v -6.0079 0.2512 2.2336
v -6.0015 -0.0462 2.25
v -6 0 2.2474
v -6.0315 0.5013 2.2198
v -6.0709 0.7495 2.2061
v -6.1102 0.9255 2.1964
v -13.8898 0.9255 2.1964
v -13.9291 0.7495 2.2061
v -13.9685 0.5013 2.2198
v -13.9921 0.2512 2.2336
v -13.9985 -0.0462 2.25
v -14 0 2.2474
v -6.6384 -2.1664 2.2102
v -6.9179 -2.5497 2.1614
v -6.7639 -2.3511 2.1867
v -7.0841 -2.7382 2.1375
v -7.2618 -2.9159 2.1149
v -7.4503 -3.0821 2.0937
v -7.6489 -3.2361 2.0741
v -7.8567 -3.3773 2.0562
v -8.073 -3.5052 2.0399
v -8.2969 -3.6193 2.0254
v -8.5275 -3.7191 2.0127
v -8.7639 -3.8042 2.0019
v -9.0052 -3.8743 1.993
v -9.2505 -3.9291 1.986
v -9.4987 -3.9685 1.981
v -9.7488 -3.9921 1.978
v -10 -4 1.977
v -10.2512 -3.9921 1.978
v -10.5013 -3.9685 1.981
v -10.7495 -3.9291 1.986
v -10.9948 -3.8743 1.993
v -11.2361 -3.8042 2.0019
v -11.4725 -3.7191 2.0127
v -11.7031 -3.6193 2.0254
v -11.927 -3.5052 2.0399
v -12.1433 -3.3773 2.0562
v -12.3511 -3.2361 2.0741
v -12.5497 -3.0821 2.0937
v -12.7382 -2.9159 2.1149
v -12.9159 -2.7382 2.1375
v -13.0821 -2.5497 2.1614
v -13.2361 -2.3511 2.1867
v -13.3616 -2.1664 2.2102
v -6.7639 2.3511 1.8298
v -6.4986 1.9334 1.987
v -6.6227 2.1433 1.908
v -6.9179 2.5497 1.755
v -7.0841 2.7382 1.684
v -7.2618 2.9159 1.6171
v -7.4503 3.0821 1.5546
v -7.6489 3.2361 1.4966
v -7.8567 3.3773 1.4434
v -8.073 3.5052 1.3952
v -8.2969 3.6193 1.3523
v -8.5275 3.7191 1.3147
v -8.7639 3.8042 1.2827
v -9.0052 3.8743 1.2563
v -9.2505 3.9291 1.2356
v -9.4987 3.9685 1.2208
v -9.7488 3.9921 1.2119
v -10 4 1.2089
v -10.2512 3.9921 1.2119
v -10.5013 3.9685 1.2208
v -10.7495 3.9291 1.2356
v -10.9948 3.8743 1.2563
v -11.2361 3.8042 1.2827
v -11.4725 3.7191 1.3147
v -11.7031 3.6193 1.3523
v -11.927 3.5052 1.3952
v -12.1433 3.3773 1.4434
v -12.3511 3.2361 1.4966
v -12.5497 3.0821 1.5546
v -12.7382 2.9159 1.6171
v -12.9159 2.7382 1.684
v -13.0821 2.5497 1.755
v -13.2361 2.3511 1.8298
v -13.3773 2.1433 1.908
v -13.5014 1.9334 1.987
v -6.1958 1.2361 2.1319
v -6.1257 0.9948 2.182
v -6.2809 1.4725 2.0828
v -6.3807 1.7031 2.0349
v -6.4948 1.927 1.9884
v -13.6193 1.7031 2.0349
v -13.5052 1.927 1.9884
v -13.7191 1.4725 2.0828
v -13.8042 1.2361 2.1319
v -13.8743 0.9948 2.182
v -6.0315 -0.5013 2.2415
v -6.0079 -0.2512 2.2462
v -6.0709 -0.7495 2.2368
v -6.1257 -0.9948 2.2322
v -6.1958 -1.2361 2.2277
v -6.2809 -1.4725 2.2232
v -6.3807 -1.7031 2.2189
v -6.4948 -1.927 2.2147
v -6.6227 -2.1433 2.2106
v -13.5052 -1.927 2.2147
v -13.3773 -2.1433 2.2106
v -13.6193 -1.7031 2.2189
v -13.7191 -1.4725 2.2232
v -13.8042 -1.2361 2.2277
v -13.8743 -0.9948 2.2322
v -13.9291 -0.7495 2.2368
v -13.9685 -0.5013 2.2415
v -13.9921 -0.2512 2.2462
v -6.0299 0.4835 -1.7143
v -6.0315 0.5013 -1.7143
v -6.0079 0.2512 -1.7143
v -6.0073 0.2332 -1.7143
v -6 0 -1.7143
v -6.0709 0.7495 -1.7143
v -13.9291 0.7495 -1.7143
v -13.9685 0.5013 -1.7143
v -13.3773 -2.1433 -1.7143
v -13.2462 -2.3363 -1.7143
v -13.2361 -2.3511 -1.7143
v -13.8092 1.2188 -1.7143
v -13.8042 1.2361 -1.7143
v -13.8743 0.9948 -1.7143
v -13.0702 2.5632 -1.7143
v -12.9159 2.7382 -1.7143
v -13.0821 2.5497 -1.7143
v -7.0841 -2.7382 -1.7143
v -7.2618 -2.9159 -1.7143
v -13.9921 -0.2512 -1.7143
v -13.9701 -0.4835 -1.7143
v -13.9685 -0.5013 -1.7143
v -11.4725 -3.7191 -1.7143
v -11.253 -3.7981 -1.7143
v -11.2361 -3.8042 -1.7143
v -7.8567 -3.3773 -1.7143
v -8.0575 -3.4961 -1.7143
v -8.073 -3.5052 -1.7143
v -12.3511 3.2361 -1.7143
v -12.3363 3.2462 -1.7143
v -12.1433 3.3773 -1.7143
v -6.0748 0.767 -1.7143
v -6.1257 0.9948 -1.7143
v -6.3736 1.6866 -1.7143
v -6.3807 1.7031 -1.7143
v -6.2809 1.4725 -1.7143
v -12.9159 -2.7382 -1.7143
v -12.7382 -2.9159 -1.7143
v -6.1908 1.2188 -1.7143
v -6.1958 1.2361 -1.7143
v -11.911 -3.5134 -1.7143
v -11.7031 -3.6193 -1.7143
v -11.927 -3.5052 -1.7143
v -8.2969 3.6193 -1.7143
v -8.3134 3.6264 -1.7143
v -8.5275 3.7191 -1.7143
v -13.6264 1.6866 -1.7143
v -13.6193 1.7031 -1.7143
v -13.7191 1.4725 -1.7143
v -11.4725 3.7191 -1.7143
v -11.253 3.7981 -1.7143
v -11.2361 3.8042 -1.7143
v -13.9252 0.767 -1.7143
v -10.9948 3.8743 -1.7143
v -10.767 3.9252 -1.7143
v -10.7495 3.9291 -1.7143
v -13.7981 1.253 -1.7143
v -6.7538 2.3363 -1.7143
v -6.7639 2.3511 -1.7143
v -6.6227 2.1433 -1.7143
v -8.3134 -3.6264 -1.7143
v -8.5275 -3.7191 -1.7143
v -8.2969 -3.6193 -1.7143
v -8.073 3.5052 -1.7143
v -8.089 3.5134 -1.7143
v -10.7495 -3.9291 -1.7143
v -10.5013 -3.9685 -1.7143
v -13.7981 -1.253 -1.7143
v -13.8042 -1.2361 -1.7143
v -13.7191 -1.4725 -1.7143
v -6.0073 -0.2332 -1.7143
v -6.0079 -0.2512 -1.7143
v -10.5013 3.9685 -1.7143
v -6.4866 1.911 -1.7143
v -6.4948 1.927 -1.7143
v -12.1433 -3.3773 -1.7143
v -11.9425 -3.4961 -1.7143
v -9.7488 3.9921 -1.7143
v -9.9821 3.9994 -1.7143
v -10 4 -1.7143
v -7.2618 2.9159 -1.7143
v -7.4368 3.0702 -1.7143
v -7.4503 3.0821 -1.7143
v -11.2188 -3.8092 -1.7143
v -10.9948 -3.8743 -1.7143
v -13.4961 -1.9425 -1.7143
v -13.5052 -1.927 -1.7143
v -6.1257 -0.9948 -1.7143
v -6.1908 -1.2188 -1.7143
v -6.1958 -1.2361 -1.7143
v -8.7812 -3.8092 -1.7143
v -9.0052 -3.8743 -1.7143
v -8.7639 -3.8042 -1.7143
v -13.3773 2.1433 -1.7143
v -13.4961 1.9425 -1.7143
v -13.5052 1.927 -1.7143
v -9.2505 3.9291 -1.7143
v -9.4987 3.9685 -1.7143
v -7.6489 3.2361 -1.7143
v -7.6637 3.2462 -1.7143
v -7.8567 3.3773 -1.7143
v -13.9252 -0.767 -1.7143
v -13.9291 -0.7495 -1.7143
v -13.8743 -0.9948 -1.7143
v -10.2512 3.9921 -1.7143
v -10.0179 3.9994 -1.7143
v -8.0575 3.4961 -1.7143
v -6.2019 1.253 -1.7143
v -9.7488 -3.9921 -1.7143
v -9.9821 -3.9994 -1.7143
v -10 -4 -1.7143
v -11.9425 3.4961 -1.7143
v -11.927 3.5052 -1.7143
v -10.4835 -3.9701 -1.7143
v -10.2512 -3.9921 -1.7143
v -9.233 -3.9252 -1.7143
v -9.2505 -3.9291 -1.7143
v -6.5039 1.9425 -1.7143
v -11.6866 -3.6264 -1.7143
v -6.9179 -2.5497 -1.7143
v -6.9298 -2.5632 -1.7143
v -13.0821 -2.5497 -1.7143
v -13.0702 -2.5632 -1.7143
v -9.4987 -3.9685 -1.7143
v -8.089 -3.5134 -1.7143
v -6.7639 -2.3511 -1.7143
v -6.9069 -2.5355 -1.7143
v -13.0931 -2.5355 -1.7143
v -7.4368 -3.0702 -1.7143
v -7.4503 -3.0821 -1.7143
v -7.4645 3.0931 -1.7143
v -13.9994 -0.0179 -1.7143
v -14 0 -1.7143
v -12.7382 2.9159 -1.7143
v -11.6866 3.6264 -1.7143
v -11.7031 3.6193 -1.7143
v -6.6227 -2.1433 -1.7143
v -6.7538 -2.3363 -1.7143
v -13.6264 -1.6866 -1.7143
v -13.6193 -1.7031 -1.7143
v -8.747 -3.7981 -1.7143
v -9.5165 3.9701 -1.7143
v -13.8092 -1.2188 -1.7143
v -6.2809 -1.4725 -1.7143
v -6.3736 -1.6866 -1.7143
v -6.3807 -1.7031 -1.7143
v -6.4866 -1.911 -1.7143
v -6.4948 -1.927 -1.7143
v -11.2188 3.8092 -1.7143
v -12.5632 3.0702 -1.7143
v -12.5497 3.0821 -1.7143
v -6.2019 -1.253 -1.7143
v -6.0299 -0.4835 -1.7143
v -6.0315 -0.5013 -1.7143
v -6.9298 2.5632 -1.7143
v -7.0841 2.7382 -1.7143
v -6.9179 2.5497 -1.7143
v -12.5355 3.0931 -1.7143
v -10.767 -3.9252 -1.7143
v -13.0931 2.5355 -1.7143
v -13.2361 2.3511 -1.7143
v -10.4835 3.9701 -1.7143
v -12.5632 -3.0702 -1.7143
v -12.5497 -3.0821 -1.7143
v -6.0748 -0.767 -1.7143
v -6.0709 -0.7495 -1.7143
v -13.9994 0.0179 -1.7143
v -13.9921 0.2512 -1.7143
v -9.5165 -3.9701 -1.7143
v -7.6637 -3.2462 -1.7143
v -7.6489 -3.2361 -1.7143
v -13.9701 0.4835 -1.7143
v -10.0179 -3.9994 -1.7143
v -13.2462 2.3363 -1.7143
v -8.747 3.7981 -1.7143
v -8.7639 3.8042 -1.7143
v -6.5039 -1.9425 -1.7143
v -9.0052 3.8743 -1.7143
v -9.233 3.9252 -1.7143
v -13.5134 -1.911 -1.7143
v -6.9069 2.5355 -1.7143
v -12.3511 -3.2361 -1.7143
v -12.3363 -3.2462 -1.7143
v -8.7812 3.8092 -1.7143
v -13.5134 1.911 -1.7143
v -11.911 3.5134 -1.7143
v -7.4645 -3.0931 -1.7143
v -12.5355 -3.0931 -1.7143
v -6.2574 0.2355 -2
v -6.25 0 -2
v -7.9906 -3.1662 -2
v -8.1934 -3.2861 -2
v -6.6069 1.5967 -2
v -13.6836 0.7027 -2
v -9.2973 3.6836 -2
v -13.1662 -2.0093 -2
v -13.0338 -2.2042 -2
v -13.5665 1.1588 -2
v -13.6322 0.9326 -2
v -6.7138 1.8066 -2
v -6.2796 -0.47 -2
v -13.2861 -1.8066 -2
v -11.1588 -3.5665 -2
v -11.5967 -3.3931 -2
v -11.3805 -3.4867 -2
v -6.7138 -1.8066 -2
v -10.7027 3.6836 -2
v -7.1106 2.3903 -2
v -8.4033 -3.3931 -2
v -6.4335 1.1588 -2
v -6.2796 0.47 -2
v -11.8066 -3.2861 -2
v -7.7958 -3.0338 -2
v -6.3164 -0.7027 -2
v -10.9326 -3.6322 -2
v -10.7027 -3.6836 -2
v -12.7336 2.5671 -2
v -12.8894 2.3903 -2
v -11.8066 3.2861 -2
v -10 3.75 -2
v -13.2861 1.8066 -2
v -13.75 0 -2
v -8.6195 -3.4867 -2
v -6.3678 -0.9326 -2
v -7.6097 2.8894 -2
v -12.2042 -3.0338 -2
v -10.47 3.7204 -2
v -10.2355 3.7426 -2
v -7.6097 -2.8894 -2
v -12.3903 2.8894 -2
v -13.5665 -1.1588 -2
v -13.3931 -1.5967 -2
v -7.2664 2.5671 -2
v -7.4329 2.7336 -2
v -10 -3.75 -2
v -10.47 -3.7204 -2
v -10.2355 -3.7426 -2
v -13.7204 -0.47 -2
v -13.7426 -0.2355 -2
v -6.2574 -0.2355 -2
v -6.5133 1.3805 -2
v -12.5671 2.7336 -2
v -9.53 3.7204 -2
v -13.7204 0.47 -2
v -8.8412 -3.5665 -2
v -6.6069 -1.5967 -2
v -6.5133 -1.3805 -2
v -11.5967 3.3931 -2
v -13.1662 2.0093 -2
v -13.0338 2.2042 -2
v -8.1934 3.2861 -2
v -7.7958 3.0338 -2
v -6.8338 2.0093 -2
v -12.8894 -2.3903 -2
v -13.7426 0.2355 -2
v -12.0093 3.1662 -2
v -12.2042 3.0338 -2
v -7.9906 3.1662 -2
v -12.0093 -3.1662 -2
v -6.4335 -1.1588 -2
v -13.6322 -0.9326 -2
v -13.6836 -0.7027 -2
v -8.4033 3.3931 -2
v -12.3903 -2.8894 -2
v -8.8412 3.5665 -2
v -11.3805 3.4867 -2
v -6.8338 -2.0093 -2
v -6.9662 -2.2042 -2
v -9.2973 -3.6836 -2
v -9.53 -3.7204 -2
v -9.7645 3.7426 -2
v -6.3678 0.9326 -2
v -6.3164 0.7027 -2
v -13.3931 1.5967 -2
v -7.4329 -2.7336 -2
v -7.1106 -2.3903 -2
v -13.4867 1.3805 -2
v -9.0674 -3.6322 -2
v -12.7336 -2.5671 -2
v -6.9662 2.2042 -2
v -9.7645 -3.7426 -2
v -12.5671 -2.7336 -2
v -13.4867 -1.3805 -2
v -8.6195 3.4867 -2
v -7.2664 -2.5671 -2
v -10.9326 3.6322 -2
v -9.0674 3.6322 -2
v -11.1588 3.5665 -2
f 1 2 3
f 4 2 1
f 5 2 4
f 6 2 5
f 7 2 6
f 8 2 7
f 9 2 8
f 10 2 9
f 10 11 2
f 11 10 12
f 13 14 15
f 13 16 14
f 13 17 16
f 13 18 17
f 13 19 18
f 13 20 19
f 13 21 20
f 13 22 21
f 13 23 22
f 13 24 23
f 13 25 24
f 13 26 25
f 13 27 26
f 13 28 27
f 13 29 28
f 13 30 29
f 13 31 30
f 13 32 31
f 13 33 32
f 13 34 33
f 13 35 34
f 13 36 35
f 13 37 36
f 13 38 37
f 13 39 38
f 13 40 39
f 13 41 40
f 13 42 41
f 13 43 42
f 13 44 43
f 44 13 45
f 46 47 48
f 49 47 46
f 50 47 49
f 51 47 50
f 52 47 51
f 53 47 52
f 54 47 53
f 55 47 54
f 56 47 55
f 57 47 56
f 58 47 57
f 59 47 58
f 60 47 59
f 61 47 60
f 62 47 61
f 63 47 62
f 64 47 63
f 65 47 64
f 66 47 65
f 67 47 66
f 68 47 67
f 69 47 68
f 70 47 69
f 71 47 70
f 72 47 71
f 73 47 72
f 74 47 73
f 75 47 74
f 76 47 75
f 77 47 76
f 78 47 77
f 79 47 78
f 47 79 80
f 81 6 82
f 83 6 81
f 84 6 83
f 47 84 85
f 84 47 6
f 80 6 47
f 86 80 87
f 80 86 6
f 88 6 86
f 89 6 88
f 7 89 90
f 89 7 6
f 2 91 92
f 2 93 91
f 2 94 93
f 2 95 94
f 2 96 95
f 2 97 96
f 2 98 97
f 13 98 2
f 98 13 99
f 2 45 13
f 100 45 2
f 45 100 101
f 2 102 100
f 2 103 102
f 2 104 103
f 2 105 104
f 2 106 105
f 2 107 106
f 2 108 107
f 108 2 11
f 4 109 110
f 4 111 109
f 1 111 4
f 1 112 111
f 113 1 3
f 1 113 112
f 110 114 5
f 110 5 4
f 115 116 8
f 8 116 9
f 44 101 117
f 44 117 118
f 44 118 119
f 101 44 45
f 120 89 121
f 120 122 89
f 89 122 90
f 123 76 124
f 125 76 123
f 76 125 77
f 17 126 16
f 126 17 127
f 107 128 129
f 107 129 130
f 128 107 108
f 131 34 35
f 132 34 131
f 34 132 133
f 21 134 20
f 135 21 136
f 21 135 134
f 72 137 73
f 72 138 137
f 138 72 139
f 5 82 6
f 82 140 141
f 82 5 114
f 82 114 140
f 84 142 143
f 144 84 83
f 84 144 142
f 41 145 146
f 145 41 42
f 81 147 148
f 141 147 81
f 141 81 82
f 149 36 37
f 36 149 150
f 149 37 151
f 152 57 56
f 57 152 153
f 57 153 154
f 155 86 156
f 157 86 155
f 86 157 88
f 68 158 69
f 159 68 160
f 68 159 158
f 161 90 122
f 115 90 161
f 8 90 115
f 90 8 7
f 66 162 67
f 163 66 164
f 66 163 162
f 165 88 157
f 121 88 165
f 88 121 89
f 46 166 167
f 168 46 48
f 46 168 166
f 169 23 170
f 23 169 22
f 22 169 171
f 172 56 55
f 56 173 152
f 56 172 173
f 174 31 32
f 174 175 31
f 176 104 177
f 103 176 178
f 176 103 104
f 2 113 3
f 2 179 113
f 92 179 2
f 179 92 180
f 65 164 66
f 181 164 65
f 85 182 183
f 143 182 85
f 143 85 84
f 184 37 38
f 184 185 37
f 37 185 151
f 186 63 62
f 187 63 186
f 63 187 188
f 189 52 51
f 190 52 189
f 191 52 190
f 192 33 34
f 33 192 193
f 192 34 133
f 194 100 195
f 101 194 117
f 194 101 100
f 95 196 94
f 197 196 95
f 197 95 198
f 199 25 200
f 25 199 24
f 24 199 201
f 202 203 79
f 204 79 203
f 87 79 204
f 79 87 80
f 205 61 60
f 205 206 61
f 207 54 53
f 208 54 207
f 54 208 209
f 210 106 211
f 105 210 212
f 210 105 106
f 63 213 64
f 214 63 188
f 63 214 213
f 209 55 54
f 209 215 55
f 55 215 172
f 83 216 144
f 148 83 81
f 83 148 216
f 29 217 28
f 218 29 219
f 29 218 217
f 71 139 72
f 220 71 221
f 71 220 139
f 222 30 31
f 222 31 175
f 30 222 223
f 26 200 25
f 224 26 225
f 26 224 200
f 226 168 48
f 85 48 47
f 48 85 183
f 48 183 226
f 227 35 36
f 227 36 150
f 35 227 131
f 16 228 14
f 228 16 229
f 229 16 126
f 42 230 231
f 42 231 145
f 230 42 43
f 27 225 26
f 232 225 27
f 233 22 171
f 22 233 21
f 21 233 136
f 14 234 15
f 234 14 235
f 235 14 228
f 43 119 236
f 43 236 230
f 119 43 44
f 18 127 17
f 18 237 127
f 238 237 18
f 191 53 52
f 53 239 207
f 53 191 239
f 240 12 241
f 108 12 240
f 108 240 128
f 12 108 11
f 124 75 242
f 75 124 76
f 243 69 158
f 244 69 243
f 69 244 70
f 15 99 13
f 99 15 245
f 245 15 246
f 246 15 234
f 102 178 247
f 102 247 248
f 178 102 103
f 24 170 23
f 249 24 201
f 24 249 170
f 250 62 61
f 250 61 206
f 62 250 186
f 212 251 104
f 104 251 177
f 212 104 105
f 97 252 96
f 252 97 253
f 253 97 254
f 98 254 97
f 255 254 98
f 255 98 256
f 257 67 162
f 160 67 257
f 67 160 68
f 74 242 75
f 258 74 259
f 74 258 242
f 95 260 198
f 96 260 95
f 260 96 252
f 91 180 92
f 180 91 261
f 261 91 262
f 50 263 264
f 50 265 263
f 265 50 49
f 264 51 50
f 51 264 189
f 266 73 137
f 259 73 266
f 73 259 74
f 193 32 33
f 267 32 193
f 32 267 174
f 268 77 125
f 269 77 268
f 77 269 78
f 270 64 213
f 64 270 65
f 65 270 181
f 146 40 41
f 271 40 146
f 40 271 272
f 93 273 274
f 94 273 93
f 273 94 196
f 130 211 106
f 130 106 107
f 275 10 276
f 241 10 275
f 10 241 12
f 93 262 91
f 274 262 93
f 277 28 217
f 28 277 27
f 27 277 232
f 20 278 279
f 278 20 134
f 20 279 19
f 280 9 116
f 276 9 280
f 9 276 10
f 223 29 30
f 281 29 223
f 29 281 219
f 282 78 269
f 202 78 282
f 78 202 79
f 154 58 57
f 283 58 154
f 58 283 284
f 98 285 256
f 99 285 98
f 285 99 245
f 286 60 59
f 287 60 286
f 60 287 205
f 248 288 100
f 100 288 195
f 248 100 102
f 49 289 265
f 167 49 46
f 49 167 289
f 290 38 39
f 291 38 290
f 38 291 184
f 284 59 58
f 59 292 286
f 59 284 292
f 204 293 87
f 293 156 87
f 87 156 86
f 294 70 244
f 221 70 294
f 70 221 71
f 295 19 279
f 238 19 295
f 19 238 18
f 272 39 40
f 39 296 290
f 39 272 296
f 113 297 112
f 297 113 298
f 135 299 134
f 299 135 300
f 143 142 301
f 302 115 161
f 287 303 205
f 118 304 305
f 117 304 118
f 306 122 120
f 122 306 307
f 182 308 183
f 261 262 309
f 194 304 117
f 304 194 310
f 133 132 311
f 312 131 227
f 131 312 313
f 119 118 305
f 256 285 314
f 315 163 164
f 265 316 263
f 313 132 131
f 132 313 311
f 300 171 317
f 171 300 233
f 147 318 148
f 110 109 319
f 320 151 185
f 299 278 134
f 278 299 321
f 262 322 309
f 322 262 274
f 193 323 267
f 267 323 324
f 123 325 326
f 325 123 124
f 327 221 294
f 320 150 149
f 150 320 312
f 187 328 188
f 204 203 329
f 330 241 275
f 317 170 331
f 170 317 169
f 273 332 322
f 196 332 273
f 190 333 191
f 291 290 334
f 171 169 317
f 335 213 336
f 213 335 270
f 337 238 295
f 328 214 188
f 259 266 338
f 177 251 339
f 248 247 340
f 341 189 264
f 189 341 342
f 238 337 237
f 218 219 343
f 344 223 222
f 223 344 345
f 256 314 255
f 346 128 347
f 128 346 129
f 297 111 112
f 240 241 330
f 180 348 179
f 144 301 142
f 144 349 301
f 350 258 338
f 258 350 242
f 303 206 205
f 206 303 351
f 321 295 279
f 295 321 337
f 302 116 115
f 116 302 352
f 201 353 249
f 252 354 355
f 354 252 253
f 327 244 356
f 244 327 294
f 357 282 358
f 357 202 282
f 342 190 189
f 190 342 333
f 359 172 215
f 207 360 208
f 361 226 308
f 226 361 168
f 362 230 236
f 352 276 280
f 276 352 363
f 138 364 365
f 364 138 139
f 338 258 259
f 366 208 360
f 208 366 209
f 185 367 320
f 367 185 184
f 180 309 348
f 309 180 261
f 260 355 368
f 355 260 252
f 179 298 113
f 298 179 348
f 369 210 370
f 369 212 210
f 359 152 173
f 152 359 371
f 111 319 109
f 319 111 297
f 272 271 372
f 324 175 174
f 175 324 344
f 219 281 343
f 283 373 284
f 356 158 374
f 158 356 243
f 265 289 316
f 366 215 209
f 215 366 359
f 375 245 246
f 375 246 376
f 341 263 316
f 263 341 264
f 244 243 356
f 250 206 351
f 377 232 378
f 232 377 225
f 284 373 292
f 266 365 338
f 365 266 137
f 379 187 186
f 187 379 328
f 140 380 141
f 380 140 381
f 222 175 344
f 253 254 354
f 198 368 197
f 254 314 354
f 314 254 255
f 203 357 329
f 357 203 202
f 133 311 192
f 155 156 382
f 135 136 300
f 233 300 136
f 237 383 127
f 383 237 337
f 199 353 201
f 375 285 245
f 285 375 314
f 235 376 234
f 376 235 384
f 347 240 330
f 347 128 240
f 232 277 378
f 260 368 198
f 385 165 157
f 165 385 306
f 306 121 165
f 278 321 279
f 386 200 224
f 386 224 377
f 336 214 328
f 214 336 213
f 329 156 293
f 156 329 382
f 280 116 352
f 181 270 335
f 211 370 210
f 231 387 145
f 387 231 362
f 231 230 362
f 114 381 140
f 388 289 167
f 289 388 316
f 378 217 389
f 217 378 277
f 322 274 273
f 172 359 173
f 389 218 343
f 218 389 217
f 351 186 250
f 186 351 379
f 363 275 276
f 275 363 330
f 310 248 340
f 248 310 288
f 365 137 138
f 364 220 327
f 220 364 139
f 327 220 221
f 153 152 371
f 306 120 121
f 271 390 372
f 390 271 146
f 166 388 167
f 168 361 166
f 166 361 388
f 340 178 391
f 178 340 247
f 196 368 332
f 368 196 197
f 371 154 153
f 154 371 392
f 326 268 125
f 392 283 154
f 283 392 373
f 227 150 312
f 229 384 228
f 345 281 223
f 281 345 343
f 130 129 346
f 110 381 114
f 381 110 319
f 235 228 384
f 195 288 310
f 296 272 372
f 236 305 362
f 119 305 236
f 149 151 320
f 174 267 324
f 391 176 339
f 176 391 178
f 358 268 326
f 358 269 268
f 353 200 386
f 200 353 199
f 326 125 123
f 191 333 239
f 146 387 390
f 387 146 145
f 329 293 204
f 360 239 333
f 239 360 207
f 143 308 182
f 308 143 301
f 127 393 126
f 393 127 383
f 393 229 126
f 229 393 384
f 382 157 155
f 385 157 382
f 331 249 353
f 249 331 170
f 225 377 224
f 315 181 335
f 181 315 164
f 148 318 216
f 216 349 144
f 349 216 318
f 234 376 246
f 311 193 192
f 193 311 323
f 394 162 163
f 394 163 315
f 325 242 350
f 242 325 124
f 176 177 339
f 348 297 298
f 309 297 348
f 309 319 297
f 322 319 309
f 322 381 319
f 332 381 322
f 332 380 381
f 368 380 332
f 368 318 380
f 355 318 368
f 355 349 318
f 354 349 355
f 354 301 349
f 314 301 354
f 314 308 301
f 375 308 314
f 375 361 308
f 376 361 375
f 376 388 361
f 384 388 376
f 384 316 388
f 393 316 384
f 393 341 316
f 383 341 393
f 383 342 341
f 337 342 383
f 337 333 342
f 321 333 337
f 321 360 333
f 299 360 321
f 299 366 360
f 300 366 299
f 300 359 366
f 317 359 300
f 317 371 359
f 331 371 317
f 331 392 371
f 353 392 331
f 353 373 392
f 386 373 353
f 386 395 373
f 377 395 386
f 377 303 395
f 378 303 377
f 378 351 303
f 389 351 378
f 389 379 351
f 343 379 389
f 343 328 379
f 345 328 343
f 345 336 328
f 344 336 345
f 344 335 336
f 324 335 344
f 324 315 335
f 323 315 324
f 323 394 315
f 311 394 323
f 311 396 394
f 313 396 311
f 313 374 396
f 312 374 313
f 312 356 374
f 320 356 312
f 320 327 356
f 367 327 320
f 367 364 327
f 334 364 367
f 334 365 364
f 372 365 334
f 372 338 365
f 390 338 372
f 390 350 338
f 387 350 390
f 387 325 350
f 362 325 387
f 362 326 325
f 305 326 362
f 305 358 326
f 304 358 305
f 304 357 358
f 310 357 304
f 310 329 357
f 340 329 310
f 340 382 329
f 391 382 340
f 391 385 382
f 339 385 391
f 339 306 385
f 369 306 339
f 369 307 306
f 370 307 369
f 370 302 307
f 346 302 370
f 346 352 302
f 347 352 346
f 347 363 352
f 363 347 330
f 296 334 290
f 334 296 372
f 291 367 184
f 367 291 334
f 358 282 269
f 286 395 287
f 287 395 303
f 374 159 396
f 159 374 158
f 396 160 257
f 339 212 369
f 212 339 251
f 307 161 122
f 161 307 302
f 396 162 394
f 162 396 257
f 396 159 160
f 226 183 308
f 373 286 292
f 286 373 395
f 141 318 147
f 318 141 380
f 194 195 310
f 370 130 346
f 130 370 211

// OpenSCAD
$fn = 100;
// Module names are of the form poly_<inkscape-path-id>().
// As a result you can associate a polygon in this OpenSCAD program with the
//  corresponding SVG element in the Inkscape document by looking for 
//  the XML element with the attribute id="inkscape-path-id".

// Paths have their own variables so they can be imported and used 
//  in polygon(points) structures in other programs.
// The NN_points is the list of all polygon XY vertices. 
// There may be an NN_paths variable as well. If it exists then it 
//  defines the nested paths. Both must be used in the 
//  polygon(points, paths) variant of the command.

profile_scale = 25.4/90; //made in inkscape in mm

// helper functions to determine the X,Y dimensions of the profiles
function min_x(shape_points) = min([ for (x = shape_points) min(x[0])]);
function max_x(shape_points) = max([ for (x = shape_points) max(x[0])]);
function min_y(shape_points) = min([ for (x = shape_points) min(x[1])]);
function max_y(shape_points) = max([ for (x = shape_points) max(x[1])]);

height = 50;
width = 1.0;


rect841_0_points = [[-2.250000,-4.000000],[1.977000,-4.000000],[2.210198,-2.166440],[2.250000,-0.046200],[2.196357,0.925498],[1.987047,1.933453],[1.208950,4.000000],[-2.250000,4.000000],[-2.250000,-4.000000]];

module poly_rect841(h, w, res=4)  {
  scale([profile_scale, -profile_scale, 1])
  union()  {
    linear_extrude(height=h)
      polygon(rect841_0_points);
  }
}

// The shapes
intersection(){
//rotate([0,-90,0]) poly_rect841(height, width);
rotate([0,-90,0]) union()  {
    linear_extrude(height=height)
      polygon(rect841_0_points);
  }

#translate([-10,0,-5]) rotate([0,0,0]) cylinder(h=30,d=8);
translate([-10,0,-2]) rotate([0,0,0]) cylinder(h=30,d1=7.5, d2=60);
}
